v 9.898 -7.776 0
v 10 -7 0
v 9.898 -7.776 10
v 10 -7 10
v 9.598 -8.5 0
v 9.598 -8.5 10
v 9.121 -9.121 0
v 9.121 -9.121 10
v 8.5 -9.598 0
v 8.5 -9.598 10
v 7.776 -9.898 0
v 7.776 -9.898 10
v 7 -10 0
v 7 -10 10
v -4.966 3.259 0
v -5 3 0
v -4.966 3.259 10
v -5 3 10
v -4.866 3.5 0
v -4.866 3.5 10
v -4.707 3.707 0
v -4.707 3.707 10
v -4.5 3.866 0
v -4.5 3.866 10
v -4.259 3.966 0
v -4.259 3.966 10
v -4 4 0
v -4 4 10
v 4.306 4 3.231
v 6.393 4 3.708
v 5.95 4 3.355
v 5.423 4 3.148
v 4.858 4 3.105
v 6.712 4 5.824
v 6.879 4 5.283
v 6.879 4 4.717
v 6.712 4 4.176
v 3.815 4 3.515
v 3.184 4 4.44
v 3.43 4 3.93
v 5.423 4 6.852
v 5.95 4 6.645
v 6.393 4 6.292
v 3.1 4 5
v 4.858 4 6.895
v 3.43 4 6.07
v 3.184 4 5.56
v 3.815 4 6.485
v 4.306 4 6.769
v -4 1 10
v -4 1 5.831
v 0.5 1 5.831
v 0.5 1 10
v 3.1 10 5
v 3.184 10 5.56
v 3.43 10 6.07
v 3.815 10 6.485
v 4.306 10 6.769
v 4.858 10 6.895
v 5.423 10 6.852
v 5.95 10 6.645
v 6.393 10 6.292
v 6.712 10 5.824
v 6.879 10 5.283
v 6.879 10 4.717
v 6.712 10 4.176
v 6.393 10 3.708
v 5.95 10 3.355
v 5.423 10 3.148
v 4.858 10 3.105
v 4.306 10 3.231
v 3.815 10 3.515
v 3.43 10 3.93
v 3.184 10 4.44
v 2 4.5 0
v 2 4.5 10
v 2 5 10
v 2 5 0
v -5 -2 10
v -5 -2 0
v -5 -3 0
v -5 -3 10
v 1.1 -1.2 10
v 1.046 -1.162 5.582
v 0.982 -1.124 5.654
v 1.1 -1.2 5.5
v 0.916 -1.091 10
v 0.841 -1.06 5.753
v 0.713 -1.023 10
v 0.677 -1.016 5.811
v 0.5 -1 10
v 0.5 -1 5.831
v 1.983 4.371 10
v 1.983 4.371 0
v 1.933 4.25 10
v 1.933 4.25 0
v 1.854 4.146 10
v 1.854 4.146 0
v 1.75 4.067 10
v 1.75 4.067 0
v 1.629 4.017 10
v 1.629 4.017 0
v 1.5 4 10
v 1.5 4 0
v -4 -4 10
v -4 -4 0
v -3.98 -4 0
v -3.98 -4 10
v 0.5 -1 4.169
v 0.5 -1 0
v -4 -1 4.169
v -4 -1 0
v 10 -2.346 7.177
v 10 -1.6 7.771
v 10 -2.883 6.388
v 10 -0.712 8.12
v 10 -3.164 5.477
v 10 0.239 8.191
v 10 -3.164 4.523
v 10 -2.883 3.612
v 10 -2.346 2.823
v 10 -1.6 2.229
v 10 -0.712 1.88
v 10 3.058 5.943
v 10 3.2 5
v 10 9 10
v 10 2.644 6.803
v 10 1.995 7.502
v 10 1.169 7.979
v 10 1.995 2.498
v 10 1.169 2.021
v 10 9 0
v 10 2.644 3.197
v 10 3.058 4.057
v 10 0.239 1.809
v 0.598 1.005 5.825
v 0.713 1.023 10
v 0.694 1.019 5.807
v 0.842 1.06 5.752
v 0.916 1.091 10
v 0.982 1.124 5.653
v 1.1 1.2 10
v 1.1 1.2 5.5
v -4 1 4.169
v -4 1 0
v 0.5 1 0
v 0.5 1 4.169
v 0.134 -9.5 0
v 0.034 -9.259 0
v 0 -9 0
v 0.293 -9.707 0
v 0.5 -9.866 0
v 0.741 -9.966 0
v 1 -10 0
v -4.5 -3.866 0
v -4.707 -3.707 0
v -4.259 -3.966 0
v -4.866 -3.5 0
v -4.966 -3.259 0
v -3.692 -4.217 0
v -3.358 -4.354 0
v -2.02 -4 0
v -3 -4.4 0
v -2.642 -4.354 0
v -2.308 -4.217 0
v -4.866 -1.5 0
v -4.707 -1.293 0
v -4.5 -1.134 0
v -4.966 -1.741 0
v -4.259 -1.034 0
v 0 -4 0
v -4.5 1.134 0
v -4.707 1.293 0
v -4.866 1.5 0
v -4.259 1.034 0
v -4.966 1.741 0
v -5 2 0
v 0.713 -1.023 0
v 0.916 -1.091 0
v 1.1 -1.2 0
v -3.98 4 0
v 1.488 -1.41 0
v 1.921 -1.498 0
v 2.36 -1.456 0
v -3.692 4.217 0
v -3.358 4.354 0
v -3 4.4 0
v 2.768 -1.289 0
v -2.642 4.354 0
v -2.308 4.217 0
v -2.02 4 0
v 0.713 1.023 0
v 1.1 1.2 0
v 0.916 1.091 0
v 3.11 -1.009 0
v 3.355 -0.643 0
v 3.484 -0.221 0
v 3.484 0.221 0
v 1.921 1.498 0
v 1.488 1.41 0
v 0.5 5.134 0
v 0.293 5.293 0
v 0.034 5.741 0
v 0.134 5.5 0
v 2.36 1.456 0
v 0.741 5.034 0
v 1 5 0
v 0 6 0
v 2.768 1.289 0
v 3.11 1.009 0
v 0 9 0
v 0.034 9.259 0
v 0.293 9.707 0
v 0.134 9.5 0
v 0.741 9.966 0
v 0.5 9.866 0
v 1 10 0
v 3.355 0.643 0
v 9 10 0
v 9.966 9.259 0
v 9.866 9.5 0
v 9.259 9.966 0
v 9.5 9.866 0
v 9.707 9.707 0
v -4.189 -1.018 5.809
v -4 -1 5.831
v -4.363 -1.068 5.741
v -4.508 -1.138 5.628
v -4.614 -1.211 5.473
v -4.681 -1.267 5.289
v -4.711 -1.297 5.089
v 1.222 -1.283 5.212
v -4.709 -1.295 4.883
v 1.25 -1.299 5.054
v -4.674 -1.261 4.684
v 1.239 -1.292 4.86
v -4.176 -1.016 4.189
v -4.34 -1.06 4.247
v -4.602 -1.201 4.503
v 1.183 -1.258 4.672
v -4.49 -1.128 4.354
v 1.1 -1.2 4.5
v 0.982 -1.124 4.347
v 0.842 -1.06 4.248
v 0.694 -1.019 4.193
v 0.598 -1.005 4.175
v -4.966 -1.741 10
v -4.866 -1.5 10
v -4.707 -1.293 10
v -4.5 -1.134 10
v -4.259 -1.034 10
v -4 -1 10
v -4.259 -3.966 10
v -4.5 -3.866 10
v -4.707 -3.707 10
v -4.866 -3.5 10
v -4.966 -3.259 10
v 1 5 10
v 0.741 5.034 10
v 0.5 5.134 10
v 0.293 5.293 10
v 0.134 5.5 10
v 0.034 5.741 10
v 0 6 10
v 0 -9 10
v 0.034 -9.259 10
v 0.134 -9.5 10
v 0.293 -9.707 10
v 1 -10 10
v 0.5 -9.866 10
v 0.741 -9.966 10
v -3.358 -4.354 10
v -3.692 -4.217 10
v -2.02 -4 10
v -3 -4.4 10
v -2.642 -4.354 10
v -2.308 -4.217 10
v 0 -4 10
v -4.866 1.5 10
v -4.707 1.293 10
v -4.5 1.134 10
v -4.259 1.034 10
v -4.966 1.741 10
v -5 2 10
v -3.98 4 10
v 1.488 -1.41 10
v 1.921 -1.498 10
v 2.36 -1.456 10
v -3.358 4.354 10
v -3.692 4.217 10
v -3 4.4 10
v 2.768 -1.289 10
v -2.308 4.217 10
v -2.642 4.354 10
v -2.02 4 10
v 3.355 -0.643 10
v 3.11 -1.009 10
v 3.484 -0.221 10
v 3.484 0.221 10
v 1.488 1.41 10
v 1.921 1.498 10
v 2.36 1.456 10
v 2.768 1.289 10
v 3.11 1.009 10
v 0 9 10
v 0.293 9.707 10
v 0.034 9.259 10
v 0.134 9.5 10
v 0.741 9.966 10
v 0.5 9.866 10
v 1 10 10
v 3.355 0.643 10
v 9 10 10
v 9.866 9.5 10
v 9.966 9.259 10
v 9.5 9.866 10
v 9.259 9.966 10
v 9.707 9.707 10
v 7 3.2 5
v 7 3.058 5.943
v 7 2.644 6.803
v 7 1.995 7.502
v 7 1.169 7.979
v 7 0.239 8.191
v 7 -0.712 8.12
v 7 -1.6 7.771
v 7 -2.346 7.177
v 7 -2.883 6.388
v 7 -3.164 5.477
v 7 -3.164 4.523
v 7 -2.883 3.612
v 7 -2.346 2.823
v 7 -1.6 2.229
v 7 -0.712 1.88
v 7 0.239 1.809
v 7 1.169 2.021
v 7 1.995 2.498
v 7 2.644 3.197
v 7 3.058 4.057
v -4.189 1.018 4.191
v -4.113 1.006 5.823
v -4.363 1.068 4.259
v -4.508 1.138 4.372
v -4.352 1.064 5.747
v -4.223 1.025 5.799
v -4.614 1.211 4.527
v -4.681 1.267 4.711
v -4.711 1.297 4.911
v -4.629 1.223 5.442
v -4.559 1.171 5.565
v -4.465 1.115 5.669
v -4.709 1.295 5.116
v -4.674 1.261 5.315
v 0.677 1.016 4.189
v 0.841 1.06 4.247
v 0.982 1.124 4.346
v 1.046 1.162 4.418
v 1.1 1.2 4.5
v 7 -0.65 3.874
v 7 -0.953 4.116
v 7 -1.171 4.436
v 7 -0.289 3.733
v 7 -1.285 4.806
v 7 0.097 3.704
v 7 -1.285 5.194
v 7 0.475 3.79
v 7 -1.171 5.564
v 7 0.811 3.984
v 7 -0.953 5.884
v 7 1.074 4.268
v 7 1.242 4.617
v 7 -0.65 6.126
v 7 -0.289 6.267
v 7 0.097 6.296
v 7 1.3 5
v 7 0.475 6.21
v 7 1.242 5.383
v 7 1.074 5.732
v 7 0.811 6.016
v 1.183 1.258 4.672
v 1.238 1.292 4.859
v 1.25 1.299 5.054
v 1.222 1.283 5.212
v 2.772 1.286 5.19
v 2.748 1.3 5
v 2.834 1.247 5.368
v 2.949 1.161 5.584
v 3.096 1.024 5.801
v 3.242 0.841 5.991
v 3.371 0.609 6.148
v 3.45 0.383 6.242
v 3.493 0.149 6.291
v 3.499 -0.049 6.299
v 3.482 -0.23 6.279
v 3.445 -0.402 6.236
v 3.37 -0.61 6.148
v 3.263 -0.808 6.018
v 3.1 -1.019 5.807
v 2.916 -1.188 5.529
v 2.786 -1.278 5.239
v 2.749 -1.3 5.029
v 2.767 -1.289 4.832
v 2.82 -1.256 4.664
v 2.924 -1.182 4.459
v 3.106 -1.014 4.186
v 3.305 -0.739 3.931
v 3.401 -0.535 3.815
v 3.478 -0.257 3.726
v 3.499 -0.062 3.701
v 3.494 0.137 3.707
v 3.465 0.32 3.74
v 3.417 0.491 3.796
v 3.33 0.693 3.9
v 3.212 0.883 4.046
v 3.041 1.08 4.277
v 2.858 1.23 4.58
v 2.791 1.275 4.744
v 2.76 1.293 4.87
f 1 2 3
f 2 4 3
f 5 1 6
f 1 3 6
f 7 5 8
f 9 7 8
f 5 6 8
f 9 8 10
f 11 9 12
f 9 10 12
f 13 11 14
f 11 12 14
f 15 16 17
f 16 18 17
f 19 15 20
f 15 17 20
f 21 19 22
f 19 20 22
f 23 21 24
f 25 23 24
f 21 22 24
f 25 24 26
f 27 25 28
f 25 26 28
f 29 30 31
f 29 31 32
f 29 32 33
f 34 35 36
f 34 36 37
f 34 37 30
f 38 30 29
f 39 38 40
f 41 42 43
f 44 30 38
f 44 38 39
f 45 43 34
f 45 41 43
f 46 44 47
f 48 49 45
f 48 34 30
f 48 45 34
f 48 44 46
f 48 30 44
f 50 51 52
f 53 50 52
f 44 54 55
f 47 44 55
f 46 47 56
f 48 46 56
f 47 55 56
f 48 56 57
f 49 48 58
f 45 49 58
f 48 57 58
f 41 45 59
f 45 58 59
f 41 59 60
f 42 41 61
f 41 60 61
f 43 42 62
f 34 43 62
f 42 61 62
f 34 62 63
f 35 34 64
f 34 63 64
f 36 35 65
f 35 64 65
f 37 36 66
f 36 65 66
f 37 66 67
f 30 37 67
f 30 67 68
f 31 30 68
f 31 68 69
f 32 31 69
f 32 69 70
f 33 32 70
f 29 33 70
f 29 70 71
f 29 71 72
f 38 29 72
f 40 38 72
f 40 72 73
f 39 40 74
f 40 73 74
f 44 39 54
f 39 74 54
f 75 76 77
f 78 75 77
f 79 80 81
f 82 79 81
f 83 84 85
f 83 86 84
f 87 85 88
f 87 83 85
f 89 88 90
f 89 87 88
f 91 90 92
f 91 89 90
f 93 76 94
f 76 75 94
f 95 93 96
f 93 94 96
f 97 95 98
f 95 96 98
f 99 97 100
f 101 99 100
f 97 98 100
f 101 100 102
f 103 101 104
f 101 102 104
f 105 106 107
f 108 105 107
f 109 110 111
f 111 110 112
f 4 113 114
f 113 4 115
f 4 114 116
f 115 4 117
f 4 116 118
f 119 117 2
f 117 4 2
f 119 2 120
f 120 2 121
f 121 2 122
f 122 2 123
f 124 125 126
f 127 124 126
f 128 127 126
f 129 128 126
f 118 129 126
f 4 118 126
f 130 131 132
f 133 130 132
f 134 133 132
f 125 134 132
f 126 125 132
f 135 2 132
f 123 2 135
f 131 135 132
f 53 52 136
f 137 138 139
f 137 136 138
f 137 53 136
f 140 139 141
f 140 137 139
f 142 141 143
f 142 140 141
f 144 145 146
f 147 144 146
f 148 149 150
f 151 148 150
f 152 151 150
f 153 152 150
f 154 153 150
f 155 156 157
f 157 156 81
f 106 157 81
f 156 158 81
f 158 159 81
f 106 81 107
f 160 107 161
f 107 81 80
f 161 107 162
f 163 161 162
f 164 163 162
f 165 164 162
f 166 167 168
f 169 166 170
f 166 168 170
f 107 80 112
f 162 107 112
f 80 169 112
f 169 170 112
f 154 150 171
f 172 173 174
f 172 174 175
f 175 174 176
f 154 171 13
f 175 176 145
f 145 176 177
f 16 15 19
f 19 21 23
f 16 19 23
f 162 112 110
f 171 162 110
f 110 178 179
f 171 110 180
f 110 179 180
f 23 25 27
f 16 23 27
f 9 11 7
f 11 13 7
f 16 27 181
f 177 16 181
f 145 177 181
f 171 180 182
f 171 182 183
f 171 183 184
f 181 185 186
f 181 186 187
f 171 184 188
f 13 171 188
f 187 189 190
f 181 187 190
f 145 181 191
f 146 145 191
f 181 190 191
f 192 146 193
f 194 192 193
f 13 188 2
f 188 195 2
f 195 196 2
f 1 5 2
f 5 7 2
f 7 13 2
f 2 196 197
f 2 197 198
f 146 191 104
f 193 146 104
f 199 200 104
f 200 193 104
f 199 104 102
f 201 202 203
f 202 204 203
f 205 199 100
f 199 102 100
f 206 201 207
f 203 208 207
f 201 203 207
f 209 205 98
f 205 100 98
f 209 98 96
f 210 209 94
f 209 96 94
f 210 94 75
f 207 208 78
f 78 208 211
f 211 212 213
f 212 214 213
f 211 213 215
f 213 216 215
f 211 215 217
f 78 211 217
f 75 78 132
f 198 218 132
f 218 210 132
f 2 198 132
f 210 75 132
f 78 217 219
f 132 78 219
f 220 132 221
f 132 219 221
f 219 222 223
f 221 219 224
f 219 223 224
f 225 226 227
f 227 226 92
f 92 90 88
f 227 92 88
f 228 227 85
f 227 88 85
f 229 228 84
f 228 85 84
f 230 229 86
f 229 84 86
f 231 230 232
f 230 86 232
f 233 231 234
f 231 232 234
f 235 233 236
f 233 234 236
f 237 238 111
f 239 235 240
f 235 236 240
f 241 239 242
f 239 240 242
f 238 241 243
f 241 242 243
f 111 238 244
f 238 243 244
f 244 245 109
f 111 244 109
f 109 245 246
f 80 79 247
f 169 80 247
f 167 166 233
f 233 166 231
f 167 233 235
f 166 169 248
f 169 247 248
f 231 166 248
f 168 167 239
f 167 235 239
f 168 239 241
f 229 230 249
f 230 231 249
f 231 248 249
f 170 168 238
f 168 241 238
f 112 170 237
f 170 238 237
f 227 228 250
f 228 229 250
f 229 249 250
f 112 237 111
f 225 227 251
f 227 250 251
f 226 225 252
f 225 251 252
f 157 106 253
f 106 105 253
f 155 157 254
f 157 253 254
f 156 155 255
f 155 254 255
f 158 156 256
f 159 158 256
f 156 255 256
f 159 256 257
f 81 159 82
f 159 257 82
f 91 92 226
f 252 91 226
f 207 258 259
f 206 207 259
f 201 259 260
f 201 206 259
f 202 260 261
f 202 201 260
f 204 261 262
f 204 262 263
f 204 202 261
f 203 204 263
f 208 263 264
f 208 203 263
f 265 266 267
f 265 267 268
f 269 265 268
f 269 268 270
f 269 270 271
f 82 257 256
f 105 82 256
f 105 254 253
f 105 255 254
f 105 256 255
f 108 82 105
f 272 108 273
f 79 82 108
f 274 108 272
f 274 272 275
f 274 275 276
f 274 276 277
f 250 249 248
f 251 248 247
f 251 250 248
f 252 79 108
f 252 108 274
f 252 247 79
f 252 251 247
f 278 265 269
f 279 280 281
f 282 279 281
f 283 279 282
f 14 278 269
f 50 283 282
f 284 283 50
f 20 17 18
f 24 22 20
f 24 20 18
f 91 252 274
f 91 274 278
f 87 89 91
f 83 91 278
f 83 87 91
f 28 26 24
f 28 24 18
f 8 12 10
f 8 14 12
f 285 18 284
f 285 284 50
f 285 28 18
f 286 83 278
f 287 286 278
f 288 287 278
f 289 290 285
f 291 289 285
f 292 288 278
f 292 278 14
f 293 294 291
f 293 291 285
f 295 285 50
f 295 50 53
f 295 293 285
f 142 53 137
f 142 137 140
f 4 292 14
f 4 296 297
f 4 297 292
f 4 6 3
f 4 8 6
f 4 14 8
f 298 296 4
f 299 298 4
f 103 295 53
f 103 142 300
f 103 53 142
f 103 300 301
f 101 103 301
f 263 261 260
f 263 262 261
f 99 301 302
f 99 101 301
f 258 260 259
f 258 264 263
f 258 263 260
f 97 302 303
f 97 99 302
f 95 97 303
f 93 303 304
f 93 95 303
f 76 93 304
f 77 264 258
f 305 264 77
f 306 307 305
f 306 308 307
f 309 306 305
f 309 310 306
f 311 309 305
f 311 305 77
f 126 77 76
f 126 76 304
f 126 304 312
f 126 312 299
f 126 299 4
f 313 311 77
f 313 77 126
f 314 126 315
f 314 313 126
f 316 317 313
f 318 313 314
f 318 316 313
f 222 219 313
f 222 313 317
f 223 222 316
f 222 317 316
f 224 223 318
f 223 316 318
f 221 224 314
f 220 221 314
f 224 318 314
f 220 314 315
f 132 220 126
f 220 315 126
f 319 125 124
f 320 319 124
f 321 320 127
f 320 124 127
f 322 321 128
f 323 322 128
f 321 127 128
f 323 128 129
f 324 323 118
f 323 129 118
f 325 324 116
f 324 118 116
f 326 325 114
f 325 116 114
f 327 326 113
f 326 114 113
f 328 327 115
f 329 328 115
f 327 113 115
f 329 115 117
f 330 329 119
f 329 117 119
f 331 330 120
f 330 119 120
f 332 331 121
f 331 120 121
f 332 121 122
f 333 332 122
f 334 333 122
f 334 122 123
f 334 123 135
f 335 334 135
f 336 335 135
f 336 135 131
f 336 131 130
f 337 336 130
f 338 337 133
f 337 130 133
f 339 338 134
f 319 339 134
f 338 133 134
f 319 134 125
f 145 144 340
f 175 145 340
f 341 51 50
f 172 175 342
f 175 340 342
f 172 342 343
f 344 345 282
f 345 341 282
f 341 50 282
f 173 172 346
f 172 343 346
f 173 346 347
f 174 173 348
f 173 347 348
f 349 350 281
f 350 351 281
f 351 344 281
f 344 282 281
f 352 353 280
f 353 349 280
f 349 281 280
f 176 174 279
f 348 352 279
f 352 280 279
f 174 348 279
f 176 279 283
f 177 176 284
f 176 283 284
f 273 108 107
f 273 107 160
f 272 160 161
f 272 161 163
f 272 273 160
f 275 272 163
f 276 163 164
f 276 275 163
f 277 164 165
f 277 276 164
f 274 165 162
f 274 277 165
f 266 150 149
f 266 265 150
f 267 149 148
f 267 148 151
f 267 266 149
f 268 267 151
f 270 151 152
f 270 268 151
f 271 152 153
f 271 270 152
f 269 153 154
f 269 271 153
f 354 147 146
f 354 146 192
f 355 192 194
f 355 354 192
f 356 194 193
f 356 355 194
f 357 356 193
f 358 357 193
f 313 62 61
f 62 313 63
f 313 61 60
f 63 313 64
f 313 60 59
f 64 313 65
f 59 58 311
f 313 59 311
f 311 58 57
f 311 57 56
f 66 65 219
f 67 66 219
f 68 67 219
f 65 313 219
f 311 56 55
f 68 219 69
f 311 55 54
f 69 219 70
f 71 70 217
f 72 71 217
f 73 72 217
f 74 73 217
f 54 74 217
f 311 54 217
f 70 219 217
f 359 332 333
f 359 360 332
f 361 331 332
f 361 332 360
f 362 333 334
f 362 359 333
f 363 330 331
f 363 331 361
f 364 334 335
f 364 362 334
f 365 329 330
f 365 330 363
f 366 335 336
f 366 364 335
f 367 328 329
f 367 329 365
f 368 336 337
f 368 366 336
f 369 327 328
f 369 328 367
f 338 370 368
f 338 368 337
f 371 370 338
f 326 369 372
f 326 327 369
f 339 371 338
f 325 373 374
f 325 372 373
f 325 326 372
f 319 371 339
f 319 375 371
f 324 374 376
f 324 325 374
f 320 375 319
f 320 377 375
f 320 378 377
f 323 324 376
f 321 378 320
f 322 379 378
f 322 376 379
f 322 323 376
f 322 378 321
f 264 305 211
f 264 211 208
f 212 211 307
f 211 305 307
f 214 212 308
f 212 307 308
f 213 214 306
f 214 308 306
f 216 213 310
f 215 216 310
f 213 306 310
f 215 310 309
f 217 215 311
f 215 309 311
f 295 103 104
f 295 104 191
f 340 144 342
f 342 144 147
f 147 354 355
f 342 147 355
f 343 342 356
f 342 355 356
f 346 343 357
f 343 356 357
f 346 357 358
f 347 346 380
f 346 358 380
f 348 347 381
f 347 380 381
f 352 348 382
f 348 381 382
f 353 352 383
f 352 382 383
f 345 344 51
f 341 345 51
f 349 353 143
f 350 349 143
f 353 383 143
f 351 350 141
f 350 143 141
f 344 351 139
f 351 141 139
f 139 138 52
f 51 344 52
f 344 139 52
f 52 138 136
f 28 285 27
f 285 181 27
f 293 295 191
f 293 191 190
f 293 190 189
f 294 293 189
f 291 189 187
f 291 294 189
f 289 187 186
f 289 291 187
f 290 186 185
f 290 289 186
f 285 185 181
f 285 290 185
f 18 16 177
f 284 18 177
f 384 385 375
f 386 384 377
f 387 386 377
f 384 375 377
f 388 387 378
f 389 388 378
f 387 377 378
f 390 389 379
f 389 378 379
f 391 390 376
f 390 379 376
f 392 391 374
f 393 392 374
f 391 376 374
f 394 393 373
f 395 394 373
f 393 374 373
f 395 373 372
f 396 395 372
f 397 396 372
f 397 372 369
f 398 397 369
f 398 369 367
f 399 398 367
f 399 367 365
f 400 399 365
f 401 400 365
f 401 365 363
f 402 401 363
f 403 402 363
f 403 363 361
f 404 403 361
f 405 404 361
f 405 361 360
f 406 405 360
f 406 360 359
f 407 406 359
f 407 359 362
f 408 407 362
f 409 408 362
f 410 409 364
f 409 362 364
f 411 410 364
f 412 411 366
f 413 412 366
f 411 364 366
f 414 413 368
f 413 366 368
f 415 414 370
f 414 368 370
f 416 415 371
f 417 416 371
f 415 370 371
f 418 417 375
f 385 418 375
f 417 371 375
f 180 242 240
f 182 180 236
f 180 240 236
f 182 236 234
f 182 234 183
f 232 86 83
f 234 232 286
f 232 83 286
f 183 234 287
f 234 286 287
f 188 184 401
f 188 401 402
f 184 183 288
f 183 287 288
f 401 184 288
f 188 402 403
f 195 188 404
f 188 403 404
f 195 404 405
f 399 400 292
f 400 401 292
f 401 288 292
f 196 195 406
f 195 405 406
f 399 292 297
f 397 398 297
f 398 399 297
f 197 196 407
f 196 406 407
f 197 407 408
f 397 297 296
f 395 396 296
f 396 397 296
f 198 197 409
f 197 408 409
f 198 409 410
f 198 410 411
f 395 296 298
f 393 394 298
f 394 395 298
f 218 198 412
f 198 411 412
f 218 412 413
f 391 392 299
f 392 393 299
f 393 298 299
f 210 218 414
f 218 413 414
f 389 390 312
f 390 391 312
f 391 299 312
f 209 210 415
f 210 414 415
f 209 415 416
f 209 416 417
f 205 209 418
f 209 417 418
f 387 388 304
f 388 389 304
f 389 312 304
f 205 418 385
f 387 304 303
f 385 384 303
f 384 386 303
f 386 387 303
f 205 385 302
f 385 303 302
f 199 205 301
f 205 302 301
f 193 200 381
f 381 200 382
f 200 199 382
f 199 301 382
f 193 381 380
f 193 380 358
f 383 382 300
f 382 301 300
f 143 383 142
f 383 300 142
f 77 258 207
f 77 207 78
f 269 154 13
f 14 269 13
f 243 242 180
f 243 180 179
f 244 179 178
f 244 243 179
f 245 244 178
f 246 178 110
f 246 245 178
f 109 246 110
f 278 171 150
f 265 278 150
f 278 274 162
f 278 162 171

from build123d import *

# Parameters (mm, degrees)
PAD_DEPTH       = 10
SKETCH001_R     = 1.5
SKETCH001_W     = 2
SKETCH001_H     = 1
POCKET_DEPTH    = 10.001
SKETCH002_R     = 1.4
PAD001_DEPTH    = 10
FILLET_R        = 1
FILLET001_R     = 1
FILLET002_R     = 1
FILLET003_R     = 3
SKETCH003_R     = 1.9
POCKET001_DEPTH = 6
FILLET004_R     = 0.5
FILLET005_R     = 1
SKETCH004_R     = 3.2
POCKET002_DEPTH = 3
SKETCH005_R     = 1.3
POCKET003_DEPTH = 15.001


with BuildPart() as part:
    # Sketch → Pad (new body)
    with BuildSketch(Plane.XY):
        Polygon((0, 4), (-5, 4), (-5, 1), (2, 1), (2, -1), (-5, -1), (-5, -4), (0, -4), (0, -10), (10, -10), (10, 10), (0, 10), align=None)
    extrude(amount=PAD_DEPTH)

    # Sketch001 (on Face14 of Pad) → Pocket (cut, through all)
    with BuildSketch(Plane.XY.offset(10)):
        with Locations((2, 0)):
            Circle(SKETCH001_R)
        with Locations((1, 4.5)):
            Rectangle(SKETCH001_W, SKETCH001_H)
    extrude(amount=-POCKET_DEPTH, mode=Mode.SUBTRACT)

    # Sketch002 (on Face4 of Pocket) → Pad001 (join)
    with BuildSketch(Plane.XY.offset(10)):
        with Locations((-3, 3)):
            Circle(SKETCH002_R)
        with Locations((-3, -3)):
            Circle(SKETCH002_R)
    extrude(amount=-PAD001_DEPTH)

    # Fillet
    fillet_edges = [part.edges().sort_by_distance(p)[0] for p in [
        (-5, 4, 5),
        (-5, 1, 5),
        (-5, -1, 5),
        (-5, -4, 5),
    ]]
    fillet(fillet_edges, radius=FILLET_R)

    # Fillet001
    fillet001_edges = [part.edges().sort_by_distance(p)[0] for p in [
        (0.881966, 1, 5),
        (0.881966, -1, 5),
    ]]
    fillet(fillet001_edges, radius=FILLET001_R)

    # Fillet002
    fillet002_edges = [part.edges().sort_by_distance(p)[0] for p in [
        (0, 5, 5),
        (0, -10, 5),
    ]]
    fillet(fillet002_edges, radius=FILLET002_R)

    # Fillet003
    fillet003_edges = [part.edges().sort_by_distance(p)[0] for p in [
        (10, -10, 5),
    ]]
    fillet(fillet003_edges, radius=FILLET003_R)

    # Sketch003 (on Face7 of Fillet003) → Pocket001 (cut)
    with BuildSketch(Plane(origin=(0, 10, 0), x_dir=(-1, 0, 0), z_dir=(0, 1, 0))):
        with Locations((-5, 5)):
            Circle(SKETCH003_R)
    extrude(amount=-POCKET001_DEPTH, mode=Mode.SUBTRACT)

    # Fillet004
    fillet004_edges = [part.edges().sort_by_distance(p)[0] for p in [
        (2, 4, 5),
    ]]
    fillet(fillet004_edges, radius=FILLET004_R)

    # Fillet005
    fillet005_edges = [part.edges().sort_by_distance(p)[0] for p in [
        (0, 10, 5),
        (10, 10, 5),
    ]]
    fillet(fillet005_edges, radius=FILLET005_R)

    # Sketch004 (on Face9 of Fillet005) → Pocket002 (cut)
    with BuildSketch(Plane.YZ.offset(10)):
        with Locations((0, 5)):
            Circle(SKETCH004_R)
    extrude(amount=-POCKET002_DEPTH, mode=Mode.SUBTRACT)

    # Sketch005 (on Face9 of Pocket002) → Pocket003 (cut, through all)
    with BuildSketch(Plane.YZ.offset(10)):
        with Locations((0, 5)):
            Circle(SKETCH005_R)
    extrude(amount=-POCKET003_DEPTH, mode=Mode.SUBTRACT)


solid = part.part
